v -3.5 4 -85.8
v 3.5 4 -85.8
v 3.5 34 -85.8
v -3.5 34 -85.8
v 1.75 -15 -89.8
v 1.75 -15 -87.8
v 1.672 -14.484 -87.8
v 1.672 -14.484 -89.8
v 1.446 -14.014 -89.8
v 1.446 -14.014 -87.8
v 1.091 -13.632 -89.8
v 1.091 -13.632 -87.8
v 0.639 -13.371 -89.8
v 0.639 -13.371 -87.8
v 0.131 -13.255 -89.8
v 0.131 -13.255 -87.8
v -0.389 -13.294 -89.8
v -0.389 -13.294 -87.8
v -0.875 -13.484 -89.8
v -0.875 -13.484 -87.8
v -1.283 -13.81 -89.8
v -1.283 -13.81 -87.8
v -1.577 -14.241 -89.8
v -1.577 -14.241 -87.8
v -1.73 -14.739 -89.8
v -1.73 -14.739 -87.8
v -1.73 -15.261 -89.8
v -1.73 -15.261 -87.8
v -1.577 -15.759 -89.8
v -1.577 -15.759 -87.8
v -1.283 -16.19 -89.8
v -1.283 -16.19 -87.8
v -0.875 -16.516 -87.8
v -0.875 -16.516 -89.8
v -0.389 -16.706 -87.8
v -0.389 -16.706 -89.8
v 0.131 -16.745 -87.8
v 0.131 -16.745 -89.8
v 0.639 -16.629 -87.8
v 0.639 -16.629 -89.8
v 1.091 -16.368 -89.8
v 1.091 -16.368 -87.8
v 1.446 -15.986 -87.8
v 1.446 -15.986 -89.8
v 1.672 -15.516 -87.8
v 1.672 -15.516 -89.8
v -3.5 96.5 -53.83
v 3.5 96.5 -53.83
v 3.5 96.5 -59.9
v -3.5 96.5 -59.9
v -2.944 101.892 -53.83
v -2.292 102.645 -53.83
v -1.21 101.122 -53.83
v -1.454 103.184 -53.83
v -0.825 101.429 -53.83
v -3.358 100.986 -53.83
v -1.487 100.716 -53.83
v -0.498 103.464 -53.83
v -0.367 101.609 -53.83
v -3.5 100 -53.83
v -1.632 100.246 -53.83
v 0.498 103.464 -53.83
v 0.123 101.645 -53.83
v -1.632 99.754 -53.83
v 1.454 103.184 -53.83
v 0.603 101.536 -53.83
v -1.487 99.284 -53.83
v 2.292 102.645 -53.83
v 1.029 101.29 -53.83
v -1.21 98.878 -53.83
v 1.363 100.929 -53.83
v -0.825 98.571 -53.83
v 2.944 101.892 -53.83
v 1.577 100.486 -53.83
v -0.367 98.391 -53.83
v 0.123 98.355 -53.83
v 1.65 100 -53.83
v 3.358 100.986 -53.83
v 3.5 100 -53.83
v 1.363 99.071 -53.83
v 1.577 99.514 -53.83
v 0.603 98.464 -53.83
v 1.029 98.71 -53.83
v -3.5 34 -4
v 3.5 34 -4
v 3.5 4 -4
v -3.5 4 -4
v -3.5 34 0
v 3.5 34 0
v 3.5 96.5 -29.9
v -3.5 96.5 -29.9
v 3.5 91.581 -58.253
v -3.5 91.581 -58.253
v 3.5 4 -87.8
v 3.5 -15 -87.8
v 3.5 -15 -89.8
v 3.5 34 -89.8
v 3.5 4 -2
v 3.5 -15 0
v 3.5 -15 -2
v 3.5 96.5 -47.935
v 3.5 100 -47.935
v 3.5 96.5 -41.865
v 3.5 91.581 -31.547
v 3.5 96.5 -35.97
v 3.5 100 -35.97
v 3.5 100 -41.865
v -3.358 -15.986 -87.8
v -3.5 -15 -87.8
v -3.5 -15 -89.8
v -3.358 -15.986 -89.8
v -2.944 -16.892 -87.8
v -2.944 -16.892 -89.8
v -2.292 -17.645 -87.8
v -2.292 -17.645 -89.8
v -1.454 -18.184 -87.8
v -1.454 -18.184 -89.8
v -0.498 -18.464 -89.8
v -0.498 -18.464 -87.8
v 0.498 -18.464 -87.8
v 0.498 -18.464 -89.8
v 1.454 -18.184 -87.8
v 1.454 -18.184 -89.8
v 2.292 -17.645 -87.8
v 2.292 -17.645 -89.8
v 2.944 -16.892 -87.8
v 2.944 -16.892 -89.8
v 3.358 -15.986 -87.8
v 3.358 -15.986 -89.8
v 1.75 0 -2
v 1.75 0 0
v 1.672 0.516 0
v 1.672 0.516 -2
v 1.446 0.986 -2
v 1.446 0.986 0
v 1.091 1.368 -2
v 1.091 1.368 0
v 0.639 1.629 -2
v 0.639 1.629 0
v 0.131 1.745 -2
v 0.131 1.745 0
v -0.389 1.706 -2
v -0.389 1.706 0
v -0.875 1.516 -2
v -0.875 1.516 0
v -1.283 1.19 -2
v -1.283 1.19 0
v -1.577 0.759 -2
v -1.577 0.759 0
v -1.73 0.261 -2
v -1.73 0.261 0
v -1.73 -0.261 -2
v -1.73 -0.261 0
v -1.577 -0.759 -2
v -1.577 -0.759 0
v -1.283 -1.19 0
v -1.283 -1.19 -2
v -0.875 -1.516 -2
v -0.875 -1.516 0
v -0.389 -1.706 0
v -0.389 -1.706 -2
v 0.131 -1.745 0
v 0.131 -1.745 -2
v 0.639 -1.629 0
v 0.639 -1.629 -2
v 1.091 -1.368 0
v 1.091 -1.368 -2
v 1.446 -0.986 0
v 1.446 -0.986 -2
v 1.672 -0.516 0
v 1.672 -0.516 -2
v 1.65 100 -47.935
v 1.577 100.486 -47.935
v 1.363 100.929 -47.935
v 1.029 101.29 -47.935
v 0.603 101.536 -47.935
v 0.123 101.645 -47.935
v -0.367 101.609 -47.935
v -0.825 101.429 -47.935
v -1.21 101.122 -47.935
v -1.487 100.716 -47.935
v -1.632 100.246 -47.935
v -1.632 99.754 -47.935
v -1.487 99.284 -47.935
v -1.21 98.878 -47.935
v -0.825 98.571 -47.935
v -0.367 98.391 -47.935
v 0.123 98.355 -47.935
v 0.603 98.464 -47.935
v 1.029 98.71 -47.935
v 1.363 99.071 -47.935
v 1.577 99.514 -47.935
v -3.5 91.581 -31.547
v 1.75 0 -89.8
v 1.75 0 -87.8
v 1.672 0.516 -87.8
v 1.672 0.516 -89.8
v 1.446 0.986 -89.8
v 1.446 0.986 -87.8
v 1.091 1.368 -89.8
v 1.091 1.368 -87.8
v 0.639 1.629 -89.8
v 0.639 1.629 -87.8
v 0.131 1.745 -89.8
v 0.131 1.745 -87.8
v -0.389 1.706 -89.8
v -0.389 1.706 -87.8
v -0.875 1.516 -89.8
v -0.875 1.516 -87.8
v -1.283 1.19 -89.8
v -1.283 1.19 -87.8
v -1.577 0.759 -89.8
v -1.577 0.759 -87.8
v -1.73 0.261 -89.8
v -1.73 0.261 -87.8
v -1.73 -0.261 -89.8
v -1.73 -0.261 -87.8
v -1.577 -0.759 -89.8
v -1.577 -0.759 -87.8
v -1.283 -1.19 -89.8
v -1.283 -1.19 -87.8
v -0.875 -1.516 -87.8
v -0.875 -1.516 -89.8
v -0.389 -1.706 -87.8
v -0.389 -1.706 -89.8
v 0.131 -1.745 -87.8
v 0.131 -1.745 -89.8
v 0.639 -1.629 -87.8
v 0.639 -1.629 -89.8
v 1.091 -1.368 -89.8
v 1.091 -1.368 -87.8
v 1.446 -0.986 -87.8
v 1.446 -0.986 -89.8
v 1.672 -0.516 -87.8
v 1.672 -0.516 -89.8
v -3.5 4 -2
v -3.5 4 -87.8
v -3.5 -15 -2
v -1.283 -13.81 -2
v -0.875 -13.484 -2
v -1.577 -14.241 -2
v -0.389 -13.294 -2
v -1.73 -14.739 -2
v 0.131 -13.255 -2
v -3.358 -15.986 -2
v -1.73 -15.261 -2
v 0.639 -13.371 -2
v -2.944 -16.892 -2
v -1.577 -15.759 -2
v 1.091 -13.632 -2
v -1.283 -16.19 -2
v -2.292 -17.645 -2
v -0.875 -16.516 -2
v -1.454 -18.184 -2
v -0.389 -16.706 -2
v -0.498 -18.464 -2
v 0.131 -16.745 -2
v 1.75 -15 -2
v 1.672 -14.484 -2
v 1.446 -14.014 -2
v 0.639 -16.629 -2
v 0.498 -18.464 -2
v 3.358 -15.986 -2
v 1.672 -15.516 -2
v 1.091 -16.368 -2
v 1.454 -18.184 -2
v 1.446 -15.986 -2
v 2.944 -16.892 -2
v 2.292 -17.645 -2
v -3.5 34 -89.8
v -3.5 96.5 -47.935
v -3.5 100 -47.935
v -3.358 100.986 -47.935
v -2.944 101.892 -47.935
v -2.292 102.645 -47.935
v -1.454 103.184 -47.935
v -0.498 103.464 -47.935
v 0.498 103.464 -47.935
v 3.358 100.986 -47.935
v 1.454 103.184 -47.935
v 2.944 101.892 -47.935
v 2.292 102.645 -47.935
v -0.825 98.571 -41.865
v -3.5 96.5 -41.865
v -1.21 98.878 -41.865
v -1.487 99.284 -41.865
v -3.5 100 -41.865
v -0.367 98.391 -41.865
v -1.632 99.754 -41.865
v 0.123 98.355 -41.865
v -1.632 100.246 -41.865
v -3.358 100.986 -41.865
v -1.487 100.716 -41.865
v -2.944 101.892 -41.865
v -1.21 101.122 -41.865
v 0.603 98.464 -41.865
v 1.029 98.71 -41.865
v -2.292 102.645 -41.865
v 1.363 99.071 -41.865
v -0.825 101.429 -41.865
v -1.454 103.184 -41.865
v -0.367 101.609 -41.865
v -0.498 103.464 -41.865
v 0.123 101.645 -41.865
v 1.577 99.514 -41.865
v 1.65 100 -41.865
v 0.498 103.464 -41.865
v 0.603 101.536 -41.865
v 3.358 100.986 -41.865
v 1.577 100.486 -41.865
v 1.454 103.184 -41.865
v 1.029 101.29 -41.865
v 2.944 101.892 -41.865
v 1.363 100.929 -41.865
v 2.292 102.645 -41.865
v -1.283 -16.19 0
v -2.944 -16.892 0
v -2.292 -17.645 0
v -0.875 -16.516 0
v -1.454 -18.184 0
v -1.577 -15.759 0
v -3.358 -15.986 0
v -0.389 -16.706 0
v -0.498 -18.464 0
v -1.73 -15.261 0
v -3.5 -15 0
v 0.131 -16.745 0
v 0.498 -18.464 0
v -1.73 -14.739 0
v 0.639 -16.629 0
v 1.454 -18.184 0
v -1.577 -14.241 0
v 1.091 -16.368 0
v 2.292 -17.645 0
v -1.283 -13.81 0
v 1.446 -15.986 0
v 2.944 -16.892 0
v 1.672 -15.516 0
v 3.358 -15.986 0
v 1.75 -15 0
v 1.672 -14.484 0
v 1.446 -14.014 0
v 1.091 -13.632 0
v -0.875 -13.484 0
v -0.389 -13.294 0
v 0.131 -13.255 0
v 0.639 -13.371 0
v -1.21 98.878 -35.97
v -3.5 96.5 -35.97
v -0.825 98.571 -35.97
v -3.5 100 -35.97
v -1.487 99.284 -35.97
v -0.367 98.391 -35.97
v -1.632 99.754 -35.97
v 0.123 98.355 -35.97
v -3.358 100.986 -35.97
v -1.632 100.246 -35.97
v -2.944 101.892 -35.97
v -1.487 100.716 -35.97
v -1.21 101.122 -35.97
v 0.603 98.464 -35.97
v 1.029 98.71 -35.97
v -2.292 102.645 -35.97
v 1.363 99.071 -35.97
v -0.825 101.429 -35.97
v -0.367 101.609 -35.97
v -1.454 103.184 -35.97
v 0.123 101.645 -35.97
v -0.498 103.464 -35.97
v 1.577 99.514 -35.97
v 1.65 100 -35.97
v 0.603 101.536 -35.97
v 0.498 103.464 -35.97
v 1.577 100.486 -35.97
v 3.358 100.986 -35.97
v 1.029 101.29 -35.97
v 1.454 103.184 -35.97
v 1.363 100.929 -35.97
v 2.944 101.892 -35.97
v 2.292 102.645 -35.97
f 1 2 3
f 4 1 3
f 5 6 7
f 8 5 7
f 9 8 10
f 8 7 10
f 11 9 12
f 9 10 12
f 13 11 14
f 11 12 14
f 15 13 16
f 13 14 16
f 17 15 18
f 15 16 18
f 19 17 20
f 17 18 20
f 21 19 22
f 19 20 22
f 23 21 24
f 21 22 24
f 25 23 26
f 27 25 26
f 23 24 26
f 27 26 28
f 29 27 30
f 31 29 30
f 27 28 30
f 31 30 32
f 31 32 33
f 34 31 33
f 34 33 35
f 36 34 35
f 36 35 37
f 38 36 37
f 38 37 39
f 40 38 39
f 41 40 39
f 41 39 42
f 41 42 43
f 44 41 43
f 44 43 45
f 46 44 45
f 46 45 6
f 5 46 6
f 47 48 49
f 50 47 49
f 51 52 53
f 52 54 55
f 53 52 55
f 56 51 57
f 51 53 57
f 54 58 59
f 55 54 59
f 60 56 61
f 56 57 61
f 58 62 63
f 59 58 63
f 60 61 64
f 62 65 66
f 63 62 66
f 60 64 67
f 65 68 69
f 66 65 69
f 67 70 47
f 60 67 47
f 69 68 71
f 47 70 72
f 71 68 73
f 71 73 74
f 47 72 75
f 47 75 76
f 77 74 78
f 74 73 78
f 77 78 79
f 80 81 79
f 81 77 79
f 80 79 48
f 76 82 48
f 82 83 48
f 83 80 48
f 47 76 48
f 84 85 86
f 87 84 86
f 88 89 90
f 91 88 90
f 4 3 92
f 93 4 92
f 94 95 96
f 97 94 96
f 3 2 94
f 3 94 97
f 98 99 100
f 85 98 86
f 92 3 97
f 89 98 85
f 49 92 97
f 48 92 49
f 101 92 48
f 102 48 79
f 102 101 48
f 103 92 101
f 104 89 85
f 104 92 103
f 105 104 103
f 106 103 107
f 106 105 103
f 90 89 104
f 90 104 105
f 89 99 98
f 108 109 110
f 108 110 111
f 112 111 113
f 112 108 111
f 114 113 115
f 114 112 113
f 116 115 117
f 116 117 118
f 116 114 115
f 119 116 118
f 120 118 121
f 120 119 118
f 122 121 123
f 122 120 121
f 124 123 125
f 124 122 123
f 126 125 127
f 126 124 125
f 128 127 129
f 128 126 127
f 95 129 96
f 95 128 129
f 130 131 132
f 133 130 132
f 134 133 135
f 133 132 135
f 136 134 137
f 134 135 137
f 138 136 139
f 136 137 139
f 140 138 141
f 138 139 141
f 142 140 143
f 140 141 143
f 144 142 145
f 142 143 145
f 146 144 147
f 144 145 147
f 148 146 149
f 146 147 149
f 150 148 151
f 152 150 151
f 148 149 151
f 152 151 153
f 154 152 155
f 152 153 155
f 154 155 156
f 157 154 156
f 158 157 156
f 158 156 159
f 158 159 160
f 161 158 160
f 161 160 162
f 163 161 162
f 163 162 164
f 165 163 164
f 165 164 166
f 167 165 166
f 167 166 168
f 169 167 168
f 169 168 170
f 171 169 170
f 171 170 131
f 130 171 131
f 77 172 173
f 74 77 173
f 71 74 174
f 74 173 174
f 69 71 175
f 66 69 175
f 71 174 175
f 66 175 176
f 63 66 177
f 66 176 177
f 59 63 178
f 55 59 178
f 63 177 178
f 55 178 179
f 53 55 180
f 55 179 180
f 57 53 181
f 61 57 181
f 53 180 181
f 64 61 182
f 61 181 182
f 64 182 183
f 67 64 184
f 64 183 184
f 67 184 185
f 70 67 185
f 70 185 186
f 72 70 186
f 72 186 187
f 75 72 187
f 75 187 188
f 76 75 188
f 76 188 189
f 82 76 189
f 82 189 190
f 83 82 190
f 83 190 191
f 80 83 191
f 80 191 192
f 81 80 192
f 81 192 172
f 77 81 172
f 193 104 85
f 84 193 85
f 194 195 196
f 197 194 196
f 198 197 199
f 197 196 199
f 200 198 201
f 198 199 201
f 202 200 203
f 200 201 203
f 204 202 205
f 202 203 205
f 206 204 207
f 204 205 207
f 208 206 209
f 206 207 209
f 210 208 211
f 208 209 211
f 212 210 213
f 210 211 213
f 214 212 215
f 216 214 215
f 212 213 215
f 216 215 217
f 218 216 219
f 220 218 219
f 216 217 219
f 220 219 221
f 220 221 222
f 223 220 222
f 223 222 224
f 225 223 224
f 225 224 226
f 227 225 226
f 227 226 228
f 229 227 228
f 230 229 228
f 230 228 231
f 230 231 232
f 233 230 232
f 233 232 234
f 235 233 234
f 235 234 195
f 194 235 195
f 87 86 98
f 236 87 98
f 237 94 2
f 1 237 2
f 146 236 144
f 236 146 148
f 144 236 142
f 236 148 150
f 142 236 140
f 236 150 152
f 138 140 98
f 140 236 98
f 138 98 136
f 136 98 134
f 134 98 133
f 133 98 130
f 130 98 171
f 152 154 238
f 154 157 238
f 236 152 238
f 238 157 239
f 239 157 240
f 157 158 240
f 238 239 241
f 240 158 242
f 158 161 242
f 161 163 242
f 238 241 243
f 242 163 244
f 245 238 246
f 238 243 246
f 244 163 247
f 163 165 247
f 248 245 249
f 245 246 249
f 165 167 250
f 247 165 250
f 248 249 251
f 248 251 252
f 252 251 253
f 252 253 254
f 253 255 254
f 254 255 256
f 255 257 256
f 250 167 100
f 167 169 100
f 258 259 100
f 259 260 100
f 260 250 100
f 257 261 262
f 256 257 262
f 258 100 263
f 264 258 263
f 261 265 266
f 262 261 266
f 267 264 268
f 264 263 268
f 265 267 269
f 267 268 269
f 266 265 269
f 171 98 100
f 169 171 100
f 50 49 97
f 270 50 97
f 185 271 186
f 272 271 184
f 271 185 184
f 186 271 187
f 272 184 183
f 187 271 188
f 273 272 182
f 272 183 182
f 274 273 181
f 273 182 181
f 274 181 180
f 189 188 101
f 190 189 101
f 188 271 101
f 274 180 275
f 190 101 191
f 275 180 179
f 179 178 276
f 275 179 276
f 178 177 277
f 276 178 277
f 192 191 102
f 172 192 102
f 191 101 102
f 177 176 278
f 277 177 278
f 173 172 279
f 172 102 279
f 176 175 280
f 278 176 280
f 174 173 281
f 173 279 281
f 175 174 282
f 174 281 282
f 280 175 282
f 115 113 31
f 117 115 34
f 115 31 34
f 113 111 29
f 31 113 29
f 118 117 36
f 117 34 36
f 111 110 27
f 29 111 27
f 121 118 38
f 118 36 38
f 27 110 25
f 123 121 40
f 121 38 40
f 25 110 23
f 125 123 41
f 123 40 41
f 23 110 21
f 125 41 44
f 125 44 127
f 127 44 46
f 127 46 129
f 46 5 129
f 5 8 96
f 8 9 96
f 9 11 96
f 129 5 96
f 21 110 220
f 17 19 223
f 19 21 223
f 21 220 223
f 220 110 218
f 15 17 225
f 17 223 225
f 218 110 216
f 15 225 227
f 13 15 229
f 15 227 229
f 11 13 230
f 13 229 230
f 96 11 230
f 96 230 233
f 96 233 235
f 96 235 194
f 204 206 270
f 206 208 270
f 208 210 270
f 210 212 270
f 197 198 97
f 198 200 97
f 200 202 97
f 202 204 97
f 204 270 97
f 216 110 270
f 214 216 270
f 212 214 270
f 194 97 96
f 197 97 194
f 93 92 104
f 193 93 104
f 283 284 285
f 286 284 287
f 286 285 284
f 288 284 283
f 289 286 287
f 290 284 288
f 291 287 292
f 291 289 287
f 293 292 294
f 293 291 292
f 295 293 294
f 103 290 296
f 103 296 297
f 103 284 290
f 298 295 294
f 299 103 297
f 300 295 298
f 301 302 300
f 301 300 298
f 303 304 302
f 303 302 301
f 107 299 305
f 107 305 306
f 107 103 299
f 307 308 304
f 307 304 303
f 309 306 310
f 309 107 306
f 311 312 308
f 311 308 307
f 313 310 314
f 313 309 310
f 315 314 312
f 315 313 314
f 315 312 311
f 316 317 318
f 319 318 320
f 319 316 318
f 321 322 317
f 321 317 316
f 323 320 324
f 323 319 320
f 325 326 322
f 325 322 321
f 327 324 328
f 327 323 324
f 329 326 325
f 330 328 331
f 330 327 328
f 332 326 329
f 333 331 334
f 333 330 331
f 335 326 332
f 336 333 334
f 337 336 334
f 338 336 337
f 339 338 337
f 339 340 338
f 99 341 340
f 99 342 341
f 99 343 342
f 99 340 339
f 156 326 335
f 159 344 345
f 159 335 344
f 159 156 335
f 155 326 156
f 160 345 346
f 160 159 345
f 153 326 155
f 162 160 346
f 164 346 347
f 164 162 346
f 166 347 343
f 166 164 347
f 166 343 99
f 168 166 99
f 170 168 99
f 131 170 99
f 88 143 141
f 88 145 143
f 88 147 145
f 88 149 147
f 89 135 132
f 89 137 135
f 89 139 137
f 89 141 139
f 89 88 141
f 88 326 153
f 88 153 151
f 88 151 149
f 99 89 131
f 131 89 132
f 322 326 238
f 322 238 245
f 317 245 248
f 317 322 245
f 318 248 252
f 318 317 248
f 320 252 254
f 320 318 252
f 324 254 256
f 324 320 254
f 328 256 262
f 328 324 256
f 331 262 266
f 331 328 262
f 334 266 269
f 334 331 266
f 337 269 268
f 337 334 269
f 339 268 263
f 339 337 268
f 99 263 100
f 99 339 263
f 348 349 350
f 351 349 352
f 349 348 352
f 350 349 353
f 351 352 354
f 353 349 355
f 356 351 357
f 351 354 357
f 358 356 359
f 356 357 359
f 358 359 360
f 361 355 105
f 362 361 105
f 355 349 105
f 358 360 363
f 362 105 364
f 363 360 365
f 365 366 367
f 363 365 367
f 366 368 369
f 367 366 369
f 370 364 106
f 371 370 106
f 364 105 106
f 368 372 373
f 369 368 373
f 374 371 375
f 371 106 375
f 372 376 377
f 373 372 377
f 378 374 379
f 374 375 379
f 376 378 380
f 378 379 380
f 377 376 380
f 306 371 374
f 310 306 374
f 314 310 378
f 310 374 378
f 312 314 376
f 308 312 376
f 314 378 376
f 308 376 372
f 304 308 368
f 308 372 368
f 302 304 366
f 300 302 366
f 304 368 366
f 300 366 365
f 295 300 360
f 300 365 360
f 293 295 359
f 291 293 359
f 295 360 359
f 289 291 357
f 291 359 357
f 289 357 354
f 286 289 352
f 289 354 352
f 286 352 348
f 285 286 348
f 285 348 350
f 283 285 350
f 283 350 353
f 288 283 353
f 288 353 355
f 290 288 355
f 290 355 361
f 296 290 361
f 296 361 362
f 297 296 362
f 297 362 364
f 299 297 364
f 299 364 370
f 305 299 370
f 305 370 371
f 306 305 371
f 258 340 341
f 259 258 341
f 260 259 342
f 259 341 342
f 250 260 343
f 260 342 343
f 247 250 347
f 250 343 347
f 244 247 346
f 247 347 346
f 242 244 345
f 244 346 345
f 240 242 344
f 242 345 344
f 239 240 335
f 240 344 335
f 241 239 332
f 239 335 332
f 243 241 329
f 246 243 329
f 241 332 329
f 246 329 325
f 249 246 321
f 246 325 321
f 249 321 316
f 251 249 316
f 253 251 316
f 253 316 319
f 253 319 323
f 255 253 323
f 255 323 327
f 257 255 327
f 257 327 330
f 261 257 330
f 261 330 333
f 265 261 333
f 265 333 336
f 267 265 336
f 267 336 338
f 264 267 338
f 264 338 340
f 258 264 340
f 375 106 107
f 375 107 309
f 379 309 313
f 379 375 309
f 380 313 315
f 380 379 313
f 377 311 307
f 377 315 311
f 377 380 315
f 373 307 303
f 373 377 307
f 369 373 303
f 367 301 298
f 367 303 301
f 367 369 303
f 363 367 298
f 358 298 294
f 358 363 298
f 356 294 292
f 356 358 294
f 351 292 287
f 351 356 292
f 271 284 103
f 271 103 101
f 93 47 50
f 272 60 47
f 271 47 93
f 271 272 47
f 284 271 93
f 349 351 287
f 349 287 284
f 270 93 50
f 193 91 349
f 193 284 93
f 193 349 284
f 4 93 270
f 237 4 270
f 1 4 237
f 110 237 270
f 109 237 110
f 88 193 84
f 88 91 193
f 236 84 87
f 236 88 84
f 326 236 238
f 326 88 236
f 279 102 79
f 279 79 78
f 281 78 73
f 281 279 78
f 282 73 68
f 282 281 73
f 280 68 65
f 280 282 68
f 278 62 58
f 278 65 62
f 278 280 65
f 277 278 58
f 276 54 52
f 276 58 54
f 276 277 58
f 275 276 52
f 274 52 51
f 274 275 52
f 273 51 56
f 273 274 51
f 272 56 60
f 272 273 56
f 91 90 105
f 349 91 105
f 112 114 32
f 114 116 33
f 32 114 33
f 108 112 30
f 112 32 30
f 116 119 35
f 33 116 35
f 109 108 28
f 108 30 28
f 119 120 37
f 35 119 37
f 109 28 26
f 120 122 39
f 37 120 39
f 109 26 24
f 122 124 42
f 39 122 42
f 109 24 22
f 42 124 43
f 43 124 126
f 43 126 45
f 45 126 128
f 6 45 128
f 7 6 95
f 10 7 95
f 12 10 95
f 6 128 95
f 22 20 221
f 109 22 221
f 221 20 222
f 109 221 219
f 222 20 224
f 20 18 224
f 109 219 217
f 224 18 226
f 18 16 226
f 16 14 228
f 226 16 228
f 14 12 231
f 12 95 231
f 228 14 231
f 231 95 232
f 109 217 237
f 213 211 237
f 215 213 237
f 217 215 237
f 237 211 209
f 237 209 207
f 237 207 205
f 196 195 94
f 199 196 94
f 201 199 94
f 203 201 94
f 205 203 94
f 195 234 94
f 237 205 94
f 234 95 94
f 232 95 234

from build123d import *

# Parameters (mm, degrees)
CROQUIS1_R              = 1.75
CROQUIS1_R_2            = 1.65
SALIENTE_EXTRUIR1_DEPTH = 89.8
CROQUIS2_W              = 6.07
CROQUIS2_H              = 7
CORTAR_EXTRUIR1_DEPTH   = 138.205284155


with BuildPart() as part:
    # Croquis1 → Saliente-Extruir1 (new body)
    with BuildSketch(Plane.XY):
        with BuildLine():
            Line((-3.5, 100), (-3.5, -15))
            ThreePointArc((-3.5, -15), (0, -18.5), (3.5, -15))
            Line((3.5, -15), (3.5, 100))
            ThreePointArc((3.5, 100), (0, 103.5), (-3.5, 100))
        make_face()
        Circle(CROQUIS1_R, mode=Mode.SUBTRACT)
        with Locations((0, -15)):
            Circle(CROQUIS1_R, mode=Mode.SUBTRACT)
        with Locations((0, 100)):
            Circle(CROQUIS1_R_2, mode=Mode.SUBTRACT)
    extrude(amount=-SALIENTE_EXTRUIR1_DEPTH)

    # Croquis2 → Cortar-Extruir1 (cut, through all)
    with BuildSketch(Plane(origin=(3.5, 0, 0), x_dir=(0, 0, -1), z_dir=(1, 0, 0))):
        Polygon((2, 4), (2, -18.5), (87.8, -18.5), (87.8, 4), (85.8, 4), (85.8, 34), (58.253185901, 91.58113315), (31.546814099, 91.58113315), (4, 34), (4, 4), align=None)
        with Locations((44.9, 100)):
            Rectangle(CROQUIS2_W, CROQUIS2_H)
        Polygon((0, 34), (29.9, 96.5), (35.97, 96.5), (35.97, 103.5), (0, 103.5), align=None)
        Polygon((59.9, 96.5), (89.8, 34), (89.8, 103.5), (53.83, 103.5), (53.83, 96.5), align=None)
    extrude(amount=-CORTAR_EXTRUIR1_DEPTH, mode=Mode.SUBTRACT)


solid = part.part
